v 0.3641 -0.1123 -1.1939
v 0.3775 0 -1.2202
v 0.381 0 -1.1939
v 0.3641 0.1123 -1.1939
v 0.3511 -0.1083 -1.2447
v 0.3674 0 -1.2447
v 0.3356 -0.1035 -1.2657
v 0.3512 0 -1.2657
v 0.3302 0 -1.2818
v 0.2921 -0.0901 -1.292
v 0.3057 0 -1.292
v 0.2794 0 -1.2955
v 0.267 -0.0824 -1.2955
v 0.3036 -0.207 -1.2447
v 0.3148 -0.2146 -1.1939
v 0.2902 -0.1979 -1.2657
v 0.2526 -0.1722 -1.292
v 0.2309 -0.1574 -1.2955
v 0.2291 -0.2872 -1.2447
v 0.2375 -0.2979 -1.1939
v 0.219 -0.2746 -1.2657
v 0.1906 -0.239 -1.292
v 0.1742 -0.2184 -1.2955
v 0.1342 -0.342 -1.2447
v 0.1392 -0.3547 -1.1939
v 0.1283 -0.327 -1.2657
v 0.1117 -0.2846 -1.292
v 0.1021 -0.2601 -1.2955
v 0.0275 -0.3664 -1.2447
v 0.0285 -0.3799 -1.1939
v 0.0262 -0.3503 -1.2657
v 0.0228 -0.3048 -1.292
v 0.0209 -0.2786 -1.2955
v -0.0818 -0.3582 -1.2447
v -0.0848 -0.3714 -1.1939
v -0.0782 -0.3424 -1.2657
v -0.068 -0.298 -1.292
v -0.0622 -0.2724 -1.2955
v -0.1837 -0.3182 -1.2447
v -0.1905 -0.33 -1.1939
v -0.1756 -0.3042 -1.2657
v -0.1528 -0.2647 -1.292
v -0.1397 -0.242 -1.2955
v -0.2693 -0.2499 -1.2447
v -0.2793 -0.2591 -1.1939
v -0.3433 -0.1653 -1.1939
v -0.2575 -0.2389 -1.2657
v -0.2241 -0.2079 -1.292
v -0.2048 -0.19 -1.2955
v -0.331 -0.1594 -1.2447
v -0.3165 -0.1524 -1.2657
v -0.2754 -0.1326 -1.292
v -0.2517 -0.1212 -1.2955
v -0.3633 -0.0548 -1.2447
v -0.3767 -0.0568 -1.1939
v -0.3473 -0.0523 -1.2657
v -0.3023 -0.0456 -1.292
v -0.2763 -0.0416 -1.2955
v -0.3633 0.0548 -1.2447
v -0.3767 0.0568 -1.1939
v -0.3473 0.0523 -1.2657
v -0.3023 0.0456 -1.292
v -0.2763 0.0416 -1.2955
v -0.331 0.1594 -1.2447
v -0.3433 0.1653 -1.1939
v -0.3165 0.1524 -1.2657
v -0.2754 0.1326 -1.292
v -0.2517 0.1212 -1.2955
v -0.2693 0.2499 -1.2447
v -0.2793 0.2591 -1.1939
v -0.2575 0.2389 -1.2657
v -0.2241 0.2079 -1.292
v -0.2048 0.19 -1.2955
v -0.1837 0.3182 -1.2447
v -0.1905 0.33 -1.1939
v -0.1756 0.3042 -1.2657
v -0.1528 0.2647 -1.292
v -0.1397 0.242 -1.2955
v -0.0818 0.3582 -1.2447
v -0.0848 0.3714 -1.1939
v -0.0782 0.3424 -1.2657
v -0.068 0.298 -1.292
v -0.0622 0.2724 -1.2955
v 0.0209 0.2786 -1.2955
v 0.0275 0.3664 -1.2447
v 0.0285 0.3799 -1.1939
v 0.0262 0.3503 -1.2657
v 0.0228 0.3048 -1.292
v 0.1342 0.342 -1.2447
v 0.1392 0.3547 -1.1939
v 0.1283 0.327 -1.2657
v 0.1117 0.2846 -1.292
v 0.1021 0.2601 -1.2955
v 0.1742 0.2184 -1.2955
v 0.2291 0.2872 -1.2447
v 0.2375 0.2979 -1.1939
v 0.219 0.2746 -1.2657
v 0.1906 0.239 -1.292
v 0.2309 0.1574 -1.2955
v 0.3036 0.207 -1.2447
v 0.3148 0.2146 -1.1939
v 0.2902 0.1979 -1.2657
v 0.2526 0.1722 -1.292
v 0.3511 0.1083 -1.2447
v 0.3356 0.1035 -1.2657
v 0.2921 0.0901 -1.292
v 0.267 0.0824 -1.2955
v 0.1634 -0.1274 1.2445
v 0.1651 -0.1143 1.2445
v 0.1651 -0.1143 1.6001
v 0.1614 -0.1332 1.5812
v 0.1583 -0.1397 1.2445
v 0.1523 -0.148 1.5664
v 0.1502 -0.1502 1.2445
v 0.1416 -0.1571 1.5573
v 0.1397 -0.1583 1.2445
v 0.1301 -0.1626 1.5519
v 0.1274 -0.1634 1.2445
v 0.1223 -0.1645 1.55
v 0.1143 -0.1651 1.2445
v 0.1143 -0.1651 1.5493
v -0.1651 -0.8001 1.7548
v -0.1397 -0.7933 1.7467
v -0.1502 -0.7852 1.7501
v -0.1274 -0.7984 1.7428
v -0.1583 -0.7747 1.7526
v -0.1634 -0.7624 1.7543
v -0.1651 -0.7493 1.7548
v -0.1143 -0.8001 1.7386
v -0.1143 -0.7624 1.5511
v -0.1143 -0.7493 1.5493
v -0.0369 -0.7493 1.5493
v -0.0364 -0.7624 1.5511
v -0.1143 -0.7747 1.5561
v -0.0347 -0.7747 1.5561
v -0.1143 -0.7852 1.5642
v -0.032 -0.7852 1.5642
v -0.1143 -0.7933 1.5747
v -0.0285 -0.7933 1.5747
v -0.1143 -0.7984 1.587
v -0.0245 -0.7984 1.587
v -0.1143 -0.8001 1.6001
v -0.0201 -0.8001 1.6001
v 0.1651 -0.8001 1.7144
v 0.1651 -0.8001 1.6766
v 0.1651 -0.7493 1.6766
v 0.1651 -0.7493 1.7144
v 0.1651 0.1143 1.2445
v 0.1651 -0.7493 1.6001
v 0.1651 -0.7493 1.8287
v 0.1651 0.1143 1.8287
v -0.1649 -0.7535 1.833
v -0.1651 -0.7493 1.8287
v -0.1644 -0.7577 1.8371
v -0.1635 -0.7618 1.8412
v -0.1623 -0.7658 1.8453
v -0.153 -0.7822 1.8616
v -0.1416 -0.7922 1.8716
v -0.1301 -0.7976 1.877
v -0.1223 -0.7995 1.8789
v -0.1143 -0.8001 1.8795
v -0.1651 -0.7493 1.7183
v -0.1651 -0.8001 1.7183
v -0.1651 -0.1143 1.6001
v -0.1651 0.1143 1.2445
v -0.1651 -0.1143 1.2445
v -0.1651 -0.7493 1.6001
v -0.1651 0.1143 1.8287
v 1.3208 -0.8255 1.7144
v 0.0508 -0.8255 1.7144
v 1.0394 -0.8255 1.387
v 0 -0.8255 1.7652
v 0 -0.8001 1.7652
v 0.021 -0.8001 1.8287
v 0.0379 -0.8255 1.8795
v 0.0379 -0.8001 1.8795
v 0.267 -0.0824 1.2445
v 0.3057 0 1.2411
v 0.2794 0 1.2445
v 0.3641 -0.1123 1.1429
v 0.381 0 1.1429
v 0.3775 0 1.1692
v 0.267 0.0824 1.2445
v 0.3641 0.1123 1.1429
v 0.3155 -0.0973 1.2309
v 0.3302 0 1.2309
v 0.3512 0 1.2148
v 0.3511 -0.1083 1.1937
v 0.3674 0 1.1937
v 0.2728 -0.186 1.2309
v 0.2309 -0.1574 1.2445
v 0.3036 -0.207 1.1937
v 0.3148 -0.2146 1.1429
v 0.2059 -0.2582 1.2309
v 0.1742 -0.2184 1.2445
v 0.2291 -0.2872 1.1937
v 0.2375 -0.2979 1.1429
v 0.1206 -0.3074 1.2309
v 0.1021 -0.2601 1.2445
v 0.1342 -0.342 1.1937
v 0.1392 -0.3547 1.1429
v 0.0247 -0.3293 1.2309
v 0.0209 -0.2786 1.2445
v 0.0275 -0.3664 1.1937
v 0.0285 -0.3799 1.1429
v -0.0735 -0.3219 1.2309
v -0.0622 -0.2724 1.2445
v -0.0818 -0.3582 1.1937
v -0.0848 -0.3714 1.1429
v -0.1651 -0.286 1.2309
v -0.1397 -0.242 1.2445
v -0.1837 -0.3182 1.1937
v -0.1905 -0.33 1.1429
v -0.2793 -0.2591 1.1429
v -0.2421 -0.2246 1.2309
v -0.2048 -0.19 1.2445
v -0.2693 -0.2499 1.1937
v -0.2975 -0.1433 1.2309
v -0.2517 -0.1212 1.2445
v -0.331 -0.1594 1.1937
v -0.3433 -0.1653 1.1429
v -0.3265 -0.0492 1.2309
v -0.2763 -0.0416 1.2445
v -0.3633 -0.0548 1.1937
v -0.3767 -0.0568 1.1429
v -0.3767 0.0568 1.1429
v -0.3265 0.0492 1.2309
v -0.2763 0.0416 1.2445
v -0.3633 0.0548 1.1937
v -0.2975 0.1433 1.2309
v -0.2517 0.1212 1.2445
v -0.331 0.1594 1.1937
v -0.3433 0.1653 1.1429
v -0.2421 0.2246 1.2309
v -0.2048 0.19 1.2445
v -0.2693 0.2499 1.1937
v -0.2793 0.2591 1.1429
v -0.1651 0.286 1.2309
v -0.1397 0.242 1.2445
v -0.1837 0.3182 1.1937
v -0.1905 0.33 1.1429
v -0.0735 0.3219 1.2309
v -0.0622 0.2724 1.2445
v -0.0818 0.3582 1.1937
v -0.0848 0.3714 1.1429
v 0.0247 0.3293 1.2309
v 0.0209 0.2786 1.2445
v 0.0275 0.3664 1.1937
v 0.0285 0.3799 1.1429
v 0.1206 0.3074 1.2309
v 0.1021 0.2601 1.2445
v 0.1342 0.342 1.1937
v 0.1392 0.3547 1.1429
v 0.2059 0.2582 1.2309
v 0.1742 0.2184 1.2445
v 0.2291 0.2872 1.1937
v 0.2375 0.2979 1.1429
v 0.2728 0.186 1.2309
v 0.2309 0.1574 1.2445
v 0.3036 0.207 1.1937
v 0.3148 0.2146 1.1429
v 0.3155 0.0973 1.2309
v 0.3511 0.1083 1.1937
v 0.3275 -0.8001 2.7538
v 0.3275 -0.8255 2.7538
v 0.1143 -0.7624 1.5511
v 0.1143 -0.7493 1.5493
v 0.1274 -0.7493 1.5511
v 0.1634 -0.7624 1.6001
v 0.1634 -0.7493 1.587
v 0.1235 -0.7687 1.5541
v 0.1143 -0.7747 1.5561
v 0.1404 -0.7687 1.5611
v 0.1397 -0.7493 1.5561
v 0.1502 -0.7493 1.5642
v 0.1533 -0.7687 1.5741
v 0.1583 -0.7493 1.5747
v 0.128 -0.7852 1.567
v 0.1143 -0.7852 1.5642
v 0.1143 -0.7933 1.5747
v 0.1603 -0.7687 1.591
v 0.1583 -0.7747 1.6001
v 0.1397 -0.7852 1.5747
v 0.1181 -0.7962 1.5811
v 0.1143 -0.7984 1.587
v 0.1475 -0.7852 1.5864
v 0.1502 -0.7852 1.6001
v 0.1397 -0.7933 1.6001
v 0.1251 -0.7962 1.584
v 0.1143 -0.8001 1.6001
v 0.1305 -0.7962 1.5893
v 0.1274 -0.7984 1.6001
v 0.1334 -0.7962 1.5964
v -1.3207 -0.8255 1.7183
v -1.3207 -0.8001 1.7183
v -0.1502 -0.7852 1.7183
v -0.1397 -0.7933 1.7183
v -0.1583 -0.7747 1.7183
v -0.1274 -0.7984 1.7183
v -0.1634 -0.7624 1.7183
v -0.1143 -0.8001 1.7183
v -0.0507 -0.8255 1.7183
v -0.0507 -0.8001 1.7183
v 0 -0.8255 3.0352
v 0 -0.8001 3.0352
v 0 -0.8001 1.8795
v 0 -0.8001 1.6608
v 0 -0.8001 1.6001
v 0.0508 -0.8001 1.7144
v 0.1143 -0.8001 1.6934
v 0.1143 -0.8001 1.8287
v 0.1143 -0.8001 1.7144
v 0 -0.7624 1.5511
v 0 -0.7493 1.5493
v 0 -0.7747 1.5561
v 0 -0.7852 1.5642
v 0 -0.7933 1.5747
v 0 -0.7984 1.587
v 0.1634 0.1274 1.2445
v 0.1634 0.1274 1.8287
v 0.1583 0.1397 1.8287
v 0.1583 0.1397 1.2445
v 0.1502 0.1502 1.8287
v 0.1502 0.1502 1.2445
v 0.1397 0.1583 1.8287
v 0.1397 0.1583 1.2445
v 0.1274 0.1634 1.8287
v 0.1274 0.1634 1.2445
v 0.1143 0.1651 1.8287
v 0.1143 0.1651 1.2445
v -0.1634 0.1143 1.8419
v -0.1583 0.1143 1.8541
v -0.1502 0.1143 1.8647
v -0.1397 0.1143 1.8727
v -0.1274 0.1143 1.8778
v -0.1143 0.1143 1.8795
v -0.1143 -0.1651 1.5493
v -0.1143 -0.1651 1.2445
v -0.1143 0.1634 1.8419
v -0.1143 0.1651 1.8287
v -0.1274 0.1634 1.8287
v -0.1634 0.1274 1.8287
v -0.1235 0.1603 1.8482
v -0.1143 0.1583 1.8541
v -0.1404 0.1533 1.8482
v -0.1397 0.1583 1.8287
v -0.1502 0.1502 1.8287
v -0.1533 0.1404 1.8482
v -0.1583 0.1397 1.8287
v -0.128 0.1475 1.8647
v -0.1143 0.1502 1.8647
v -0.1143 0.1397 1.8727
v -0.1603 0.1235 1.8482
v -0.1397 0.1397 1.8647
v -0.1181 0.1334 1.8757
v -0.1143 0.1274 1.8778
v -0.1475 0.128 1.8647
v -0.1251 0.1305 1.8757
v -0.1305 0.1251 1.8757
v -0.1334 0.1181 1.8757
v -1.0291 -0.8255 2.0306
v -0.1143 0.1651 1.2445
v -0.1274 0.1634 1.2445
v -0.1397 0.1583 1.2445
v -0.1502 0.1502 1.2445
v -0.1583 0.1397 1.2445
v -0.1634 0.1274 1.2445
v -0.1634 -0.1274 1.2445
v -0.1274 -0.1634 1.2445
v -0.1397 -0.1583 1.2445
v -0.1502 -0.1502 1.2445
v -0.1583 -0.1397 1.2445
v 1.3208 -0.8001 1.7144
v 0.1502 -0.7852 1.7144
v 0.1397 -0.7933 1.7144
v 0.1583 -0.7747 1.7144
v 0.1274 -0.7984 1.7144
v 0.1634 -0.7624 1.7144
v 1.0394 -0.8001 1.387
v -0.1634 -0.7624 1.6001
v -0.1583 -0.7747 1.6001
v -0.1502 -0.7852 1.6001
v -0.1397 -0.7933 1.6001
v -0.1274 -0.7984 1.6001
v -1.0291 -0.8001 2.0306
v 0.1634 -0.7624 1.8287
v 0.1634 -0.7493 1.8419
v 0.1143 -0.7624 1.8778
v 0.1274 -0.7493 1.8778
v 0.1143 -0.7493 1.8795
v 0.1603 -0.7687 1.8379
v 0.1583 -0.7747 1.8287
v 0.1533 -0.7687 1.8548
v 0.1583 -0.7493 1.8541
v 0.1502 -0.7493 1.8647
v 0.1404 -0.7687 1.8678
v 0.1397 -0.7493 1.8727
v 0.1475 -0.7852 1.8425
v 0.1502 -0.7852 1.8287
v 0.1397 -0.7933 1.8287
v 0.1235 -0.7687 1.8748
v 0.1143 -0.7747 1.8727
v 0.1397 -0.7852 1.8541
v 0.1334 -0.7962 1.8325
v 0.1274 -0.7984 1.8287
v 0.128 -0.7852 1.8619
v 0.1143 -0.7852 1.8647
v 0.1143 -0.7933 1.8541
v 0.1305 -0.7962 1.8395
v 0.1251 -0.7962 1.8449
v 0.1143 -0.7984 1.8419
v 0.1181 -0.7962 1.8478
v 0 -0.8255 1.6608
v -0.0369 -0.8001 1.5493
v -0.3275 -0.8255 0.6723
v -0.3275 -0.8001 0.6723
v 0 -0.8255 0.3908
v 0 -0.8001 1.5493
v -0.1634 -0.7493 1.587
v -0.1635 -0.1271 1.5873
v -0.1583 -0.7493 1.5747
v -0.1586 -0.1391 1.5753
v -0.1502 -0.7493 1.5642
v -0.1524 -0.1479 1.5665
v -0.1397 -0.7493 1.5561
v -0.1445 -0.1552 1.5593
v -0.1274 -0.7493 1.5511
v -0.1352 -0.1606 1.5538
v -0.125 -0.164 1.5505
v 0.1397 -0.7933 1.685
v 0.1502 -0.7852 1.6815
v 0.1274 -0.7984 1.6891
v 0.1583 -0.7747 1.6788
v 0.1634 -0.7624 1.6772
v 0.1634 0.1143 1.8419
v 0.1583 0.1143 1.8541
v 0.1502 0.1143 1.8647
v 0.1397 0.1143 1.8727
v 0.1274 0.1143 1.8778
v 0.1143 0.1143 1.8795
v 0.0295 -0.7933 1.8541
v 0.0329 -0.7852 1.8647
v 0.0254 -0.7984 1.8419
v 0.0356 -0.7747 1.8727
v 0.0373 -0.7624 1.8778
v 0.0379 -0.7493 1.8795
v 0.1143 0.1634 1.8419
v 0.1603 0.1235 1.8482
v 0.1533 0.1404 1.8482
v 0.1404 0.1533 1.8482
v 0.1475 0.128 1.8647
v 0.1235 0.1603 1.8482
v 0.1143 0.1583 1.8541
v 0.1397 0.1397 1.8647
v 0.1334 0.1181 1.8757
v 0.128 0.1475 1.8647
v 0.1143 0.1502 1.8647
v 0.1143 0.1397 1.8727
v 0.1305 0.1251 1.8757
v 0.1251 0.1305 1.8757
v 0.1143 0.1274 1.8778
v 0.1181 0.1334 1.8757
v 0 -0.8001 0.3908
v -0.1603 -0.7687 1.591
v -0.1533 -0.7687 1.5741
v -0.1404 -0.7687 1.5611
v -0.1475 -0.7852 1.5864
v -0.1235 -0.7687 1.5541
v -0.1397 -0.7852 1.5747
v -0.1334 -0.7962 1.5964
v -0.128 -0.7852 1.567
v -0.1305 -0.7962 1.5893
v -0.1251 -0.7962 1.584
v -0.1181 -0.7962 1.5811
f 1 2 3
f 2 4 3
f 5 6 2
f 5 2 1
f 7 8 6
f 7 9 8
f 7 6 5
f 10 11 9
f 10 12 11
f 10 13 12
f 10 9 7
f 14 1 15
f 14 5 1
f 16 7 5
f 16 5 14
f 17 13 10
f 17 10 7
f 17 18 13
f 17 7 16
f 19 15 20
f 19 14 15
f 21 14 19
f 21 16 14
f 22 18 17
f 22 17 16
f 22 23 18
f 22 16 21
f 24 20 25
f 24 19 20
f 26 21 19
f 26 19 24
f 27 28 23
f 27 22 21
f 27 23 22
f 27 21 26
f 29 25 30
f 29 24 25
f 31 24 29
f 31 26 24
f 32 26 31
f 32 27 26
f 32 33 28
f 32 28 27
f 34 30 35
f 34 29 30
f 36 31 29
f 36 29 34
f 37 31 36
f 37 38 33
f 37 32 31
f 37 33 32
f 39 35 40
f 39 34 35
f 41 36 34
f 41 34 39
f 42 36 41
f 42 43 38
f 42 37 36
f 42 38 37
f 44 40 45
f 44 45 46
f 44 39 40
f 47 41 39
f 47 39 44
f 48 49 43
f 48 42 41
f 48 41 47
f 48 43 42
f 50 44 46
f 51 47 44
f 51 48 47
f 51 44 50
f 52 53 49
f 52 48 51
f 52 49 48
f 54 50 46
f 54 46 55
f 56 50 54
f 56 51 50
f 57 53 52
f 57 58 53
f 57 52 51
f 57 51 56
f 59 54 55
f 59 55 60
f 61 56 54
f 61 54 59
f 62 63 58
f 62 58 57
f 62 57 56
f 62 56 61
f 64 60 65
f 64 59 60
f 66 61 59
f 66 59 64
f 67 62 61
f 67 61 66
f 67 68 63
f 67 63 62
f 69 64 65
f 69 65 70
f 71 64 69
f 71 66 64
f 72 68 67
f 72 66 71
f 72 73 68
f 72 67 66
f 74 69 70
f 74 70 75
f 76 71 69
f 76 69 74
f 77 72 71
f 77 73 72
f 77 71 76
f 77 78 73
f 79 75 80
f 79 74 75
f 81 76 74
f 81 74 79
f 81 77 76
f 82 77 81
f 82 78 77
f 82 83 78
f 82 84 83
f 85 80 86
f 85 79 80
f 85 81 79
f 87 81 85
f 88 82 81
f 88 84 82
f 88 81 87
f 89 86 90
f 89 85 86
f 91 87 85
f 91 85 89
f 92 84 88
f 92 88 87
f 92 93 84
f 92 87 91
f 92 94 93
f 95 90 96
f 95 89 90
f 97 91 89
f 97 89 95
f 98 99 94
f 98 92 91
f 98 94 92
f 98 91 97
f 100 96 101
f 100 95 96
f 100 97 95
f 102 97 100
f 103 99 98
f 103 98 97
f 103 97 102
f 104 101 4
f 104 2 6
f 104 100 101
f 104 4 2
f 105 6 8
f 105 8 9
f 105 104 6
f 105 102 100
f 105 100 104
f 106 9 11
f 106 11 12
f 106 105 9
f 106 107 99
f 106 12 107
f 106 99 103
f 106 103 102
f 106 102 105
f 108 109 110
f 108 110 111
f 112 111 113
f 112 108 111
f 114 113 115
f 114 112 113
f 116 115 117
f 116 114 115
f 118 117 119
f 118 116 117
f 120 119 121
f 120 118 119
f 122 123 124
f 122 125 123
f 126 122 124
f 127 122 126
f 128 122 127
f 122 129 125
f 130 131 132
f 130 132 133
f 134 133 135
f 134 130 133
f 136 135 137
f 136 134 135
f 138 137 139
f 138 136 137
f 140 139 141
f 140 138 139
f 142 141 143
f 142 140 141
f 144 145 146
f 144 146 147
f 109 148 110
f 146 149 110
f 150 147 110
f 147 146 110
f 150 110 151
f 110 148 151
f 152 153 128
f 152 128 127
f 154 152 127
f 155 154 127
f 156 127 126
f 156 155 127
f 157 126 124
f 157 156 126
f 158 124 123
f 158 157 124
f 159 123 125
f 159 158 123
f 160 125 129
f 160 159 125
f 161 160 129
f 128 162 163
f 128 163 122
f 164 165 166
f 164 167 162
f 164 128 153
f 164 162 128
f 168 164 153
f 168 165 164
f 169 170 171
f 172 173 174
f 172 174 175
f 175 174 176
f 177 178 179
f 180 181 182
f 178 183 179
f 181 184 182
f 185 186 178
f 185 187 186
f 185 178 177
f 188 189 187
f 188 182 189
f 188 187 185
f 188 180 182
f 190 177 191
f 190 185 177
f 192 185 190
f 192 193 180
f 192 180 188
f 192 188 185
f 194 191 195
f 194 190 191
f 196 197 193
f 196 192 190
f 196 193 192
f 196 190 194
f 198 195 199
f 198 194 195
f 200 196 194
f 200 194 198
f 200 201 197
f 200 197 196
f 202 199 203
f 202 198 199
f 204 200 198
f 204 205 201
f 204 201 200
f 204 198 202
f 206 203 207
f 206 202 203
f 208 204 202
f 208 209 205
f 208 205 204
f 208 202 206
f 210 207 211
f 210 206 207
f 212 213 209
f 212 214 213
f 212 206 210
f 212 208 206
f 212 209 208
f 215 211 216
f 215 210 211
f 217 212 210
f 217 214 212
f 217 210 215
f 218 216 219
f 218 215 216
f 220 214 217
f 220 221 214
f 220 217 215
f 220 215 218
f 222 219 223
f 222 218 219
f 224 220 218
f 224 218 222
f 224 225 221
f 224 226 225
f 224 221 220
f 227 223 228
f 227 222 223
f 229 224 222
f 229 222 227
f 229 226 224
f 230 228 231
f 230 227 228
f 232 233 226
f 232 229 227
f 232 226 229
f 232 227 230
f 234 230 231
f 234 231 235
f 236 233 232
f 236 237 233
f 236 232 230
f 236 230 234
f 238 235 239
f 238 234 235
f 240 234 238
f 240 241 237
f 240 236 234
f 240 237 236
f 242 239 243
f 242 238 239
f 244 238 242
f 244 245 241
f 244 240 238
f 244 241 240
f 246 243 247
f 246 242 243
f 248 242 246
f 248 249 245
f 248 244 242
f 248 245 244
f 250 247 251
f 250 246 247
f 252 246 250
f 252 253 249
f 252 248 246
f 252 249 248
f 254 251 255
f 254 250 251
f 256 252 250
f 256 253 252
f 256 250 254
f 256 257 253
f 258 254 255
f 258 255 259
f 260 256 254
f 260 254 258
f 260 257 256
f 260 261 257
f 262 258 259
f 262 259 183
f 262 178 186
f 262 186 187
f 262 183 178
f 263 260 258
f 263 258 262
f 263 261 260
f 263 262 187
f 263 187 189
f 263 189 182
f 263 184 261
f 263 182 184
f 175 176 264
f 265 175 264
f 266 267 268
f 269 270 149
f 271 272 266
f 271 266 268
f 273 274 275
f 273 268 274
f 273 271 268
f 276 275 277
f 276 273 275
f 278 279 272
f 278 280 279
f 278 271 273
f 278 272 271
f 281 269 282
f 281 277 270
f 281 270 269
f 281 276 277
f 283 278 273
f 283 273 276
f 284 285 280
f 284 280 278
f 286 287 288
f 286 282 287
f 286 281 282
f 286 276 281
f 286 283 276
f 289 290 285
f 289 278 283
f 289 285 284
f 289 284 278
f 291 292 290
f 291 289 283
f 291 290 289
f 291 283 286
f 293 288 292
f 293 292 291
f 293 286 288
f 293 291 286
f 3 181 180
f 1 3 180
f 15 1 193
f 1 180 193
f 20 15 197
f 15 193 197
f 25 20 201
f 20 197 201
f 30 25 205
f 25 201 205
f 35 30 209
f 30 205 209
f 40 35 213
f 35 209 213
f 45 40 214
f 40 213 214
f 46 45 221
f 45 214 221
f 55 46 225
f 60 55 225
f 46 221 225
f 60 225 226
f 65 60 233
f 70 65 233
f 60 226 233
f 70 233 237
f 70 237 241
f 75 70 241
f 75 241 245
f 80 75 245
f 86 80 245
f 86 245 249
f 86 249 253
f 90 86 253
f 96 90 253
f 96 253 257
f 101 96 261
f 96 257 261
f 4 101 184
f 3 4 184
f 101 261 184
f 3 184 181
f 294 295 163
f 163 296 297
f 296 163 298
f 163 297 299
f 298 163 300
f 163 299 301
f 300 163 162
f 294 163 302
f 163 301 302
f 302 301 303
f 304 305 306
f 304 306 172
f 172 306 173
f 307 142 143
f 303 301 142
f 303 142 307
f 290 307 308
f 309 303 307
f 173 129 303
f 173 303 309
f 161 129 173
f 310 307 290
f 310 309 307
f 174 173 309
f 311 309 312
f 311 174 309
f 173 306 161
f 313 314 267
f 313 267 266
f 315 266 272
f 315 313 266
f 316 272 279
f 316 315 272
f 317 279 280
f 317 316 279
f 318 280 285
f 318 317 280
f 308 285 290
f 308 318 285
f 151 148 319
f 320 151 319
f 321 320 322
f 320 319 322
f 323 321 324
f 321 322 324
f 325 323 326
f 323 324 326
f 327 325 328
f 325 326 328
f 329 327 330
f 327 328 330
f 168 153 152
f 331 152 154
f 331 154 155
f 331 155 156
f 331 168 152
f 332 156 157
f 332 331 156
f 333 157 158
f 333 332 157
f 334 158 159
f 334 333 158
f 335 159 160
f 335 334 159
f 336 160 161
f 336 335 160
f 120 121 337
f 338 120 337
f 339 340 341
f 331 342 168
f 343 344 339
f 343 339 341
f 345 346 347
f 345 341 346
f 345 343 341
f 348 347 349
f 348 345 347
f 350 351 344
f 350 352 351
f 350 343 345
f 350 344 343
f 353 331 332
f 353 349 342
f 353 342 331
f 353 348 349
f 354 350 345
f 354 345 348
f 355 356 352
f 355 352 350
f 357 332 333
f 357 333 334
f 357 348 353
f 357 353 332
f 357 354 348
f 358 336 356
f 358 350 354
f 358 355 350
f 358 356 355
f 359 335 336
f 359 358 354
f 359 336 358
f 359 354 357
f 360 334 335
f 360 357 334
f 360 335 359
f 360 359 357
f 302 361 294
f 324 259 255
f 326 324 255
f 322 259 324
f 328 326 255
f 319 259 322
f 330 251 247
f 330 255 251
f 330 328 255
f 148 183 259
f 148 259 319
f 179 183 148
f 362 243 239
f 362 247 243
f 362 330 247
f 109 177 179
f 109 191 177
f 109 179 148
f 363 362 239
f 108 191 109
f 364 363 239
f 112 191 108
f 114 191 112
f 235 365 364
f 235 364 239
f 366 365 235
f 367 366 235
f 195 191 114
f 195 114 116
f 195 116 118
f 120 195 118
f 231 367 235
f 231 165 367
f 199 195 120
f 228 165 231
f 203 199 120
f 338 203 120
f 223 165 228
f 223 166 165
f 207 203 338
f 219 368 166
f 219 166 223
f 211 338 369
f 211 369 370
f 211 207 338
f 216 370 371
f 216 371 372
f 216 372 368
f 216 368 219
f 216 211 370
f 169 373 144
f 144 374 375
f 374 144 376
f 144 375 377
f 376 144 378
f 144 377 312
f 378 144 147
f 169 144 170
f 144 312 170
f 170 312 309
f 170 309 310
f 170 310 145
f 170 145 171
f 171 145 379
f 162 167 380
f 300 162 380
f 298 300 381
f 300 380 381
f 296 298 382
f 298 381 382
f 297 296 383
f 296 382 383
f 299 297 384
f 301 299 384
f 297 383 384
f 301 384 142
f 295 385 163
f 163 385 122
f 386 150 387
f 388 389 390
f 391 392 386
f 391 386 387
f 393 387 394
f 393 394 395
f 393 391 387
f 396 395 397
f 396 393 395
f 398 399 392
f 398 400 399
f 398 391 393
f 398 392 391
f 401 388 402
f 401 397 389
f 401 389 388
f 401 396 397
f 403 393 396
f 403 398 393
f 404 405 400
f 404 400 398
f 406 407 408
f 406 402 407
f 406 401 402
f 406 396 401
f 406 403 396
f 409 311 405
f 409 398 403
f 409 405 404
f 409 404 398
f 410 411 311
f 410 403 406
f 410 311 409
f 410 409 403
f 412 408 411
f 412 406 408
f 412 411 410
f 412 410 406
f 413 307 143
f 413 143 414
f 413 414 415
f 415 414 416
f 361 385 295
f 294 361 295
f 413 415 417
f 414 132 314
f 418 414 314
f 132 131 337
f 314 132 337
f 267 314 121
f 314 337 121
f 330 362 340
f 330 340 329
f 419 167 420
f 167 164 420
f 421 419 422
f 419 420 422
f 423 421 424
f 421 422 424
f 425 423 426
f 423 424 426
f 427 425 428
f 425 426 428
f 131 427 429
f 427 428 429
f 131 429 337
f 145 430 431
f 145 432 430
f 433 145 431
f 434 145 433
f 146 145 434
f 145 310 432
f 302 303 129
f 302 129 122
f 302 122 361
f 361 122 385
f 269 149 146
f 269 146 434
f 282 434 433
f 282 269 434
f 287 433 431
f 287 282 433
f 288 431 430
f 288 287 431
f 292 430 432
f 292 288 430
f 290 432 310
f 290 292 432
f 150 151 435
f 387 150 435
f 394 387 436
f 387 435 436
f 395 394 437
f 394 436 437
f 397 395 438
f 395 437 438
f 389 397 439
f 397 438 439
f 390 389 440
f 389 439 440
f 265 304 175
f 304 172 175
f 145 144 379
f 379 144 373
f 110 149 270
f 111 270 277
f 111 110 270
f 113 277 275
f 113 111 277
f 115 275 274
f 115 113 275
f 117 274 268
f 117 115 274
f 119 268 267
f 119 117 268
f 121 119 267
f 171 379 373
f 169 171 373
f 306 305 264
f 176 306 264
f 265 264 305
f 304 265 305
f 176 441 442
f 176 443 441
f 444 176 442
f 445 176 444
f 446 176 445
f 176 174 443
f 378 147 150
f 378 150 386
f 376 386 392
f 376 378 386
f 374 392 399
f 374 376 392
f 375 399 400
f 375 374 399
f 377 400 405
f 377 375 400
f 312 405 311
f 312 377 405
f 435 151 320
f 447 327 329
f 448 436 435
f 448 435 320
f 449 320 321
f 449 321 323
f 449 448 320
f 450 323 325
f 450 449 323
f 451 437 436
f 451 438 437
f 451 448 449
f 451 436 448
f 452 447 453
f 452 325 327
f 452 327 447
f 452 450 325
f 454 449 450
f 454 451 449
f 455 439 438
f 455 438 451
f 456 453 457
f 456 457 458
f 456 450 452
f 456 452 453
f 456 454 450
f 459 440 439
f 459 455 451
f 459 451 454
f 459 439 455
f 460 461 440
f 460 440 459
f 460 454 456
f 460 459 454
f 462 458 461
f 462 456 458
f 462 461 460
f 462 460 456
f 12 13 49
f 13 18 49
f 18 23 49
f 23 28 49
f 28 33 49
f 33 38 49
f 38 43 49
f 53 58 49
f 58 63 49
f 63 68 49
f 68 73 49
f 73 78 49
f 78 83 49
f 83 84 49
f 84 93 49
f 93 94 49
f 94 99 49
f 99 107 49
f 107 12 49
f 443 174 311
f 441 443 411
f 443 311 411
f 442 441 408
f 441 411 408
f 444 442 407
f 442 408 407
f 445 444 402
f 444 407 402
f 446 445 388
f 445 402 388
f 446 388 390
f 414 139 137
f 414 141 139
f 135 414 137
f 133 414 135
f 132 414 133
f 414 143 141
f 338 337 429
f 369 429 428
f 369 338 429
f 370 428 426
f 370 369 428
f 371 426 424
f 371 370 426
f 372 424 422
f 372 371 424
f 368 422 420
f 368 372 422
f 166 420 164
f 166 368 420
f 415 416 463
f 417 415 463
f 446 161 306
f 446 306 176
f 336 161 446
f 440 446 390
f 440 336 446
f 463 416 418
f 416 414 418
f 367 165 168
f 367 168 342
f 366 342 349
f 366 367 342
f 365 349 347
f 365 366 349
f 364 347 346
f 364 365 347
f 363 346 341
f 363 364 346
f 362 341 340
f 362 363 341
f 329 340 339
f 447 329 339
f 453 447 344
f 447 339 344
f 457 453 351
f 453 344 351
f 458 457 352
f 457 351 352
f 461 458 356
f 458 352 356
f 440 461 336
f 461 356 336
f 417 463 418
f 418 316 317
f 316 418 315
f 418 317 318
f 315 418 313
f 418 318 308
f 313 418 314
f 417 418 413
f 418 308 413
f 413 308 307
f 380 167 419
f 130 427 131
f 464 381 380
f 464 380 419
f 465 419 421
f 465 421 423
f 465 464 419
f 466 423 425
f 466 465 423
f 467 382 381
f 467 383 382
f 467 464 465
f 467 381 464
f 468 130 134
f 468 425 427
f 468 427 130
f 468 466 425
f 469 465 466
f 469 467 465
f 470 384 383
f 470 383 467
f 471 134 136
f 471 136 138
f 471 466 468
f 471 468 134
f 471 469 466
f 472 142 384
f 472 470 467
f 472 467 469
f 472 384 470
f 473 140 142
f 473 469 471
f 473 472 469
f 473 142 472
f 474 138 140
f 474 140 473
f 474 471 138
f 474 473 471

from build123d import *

# Parameters (mm, degrees)
F0_W           = 0.381
F0_H           = 2.54
F2_W           = 0.3302
F2_H           = 0.3302
F3_DEPTH       = 0.635
F4_W           = 0.3302
F4_H           = 0.3302
F5_DEPTH       = 0.635
F6_DEPTH       = 0.635
F8_DEPTH       = 0.0254
F9_DEPTH       = 0.0254
F11_DEPTH      = 0.0254
F13_DEPTH      = 0.0254
F15_DEPTH      = 0.0254
F16_T1_DEPTH   = 0.8636
F16_T3_DEPTH   = 0.5842
F16_T5_DEPTH   = 0.3048
F16_T7_DEPTH   = 0.5842
F16_T9_DEPTH   = 0.2286
F16_T11_DEPTH  = 1.0414
F16_T13_DEPTH  = 0.1181413534
F16_T15_DEPTH  = 0.1143
F16_T17_DEPTH  = 0.1143
F16_S21_W      = 0.051816
F16_S21_H      = 0.051816
F16_T22_DEPTH  = 0.051816
F16_S27_W      = 0.051816
F16_S27_H      = 0.051816
F16_T28_DEPTH  = 0.051816
F16_S33_W      = 0.051816
F16_S33_H      = 0.051816
F16_T34_DEPTH  = 0.051816
F16_S39_W      = 0.051816
F16_S39_H      = 0.051816
F16_T40_DEPTH  = 0.051816
F16_S45_W      = 0.051816
F16_S45_H      = 0.051816
F16_T46_DEPTH  = 0.051816
F16_T52_DEPTH  = 0.3787263164
F16_T57_DEPTH  = 0.3787263164
F16_T62_DEPTH  = 0.2451413534
F16_T67_DEPTH  = 0.2413
F16_T72_DEPTH  = 0.2043645658
F16_T77_DEPTH  = 0.2043645658
F16_T82_DEPTH  = 0.2413
F16_T87_DEPTH  = 0.2034354496
F16_T92_DEPTH  = 0.2034354496
F16_T97_DEPTH  = 0.2034354496
F16_T103_DEPTH = 0.4318
F16_T107_DEPTH = 0.7112
F16_T114_DEPTH = 0.4318
F16_T118_DEPTH = 0.7112
F17_R          = 0.1016


# Not quite as in the source:
# - a fillet or chamfer that OpenCascade refuses, or shapes differently, is made with other operations: its cross-section is extruded or revolved along the edge and cut away or added
# - a feature names something its author has since deleted; it is built from what else it names


with BuildPart() as f1:
    # F0 (on Front) → F1 (revolve)
    with BuildSketch(Plane.XZ):
        with Locations((0.1905, -0.0254572569)):
            Rectangle(F0_W, F0_H)
    revolve(axis=Axis((0, 0, -0.0254572569), (0, 0, -1)))

    # F2 (on face) → F3 (join)
    with BuildSketch(Plane.XY.offset(1.2445427431)):
        Rectangle(F2_W, F2_H)
    extrude(amount=F3_DEPTH)

    # F4 (on face) → F5 (join)
    with BuildSketch(Plane.XZ.offset(0.1651)):
        with Locations((0, 1.7144427431)):
            Rectangle(F4_W, F4_H)
    extrude(amount=F5_DEPTH)

    # F2 (on face) → F6 (join)
    with BuildSketch(Plane.XY.offset(1.2445427431)):
        Rectangle(F2_W, F2_H)
    extrude(amount=F6_DEPTH)

    # F7 (on face) → F8 (join)
    with BuildSketch(Plane.XZ.offset(0.8001)):
        Polygon((0, 3.0352427431), (0, 1.8795427431), (0.0378645504, 1.8795427431), (0.3274862888, 2.7538107431), align=None)
        Polygon((0, 1.8795427431), (0, 1.7652427431), (0.0378645504, 1.8795427431), align=None)
    extrude(amount=F8_DEPTH)

    # F7 (on face) → F9 (join)
    with BuildSketch(Plane.XZ.offset(0.8001)):
        Polygon((0, 3.0352427431), (0, 1.7652427431), (0.3274862888, 2.7538107431), align=None)
    extrude(amount=F9_DEPTH)

    # F10 (on face) → F11 (join)
    with BuildSketch(Plane.XZ.offset(0.8001)):
        Polygon((1.3208, 1.7144427431), (0.0508, 1.7144427431), (1.039368, 1.3869564543), align=None)
    extrude(amount=F11_DEPTH)

    # F12 (on face) → F13 (join)
    with BuildSketch(Plane.XZ.offset(0.8001)):
        Polygon((0, 0.3908380623), (0, 1.6608380623), (-0.3274862888, 0.6722700623), align=None)
    extrude(amount=F13_DEPTH)

    # F14 (on face) → F15 (join)
    with BuildSketch(Plane.XZ.offset(0.8001)):
        Polygon((-1.3206545556, 1.7182840966), (-0.0506545556, 1.7182840966), (-1.0291112121, 2.0306189544), align=None)
    extrude(amount=F15_DEPTH)

    # F16: fillet of radius 0.0508 on 16 edges, made by hand

    # F16_s2 → F16_t1 (cut)
    with BuildSketch(Plane.XZ.offset(-0.1143)):
        with BuildLine():
            ThreePointArc((0.1651, 1.8287427431), (0.1502210245, 1.8646637676), (0.1143, 1.8795427431))
            Line((0.1143, 1.8795427431), (0.1651, 1.8795427431))
            Line((0.1651, 1.8795427431), (0.1651, 1.8287427431))
        make_face()
    extrude(amount=F16_T1_DEPTH, mode=Mode.SUBTRACT)

    # F16_s4 → F16_t3 (cut)
    with BuildSketch(Plane.XZ.offset(0.1651)):
        with BuildLine():
            ThreePointArc((0.1651, 1.6001427431), (0.1502210245, 1.5642217186), (0.1143, 1.5493427431))
            Line((0.1143, 1.5493427431), (0.1651, 1.5493427431))
            Line((0.1651, 1.5493427431), (0.1651, 1.6001427431))
        make_face()
        with BuildLine():
            ThreePointArc((-0.1651, 1.6001427431), (-0.1502210245, 1.5642217186), (-0.1143, 1.5493427431))
            Line((-0.1143, 1.5493427431), (-0.1651, 1.5493427431))
            Line((-0.1651, 1.5493427431), (-0.1651, 1.6001427431))
        make_face()
    extrude(amount=F16_T3_DEPTH, mode=Mode.SUBTRACT)

    # F16_s6 → F16_t5 (cut)
    with BuildSketch(Plane.XY.offset(1.2445427431)):
        with BuildLine():
            ThreePointArc((0.1651, -0.1143), (0.1502210245, -0.1502210245), (0.1143, -0.1651))
            Line((0.1143, -0.1651), (0.1651, -0.1651))
            Line((0.1651, -0.1651), (0.1651, -0.1143))
        make_face()
        with BuildLine():
            ThreePointArc((-0.1143, -0.1651), (-0.1502210245, -0.1502210245), (-0.1651, -0.1143))
            Line((-0.1651, -0.1143), (-0.1651, -0.1651))
            Line((-0.1651, -0.1651), (-0.1143, -0.1651))
        make_face()
    extrude(amount=F16_T5_DEPTH, mode=Mode.SUBTRACT)

    # F16_s8 → F16_t7 (cut)
    with BuildSketch(Plane.XY.offset(1.2445427431)):
        with BuildLine():
            ThreePointArc((0.1651, 0.1143), (0.1502210245, 0.1502210245), (0.1143, 0.1651))
            Line((0.1143, 0.1651), (0.1651, 0.1651))
            Line((0.1651, 0.1651), (0.1651, 0.1143))
        make_face()
        with BuildLine():
            ThreePointArc((-0.1651, 0.1143), (-0.1502210245, 0.1502210245), (-0.1143, 0.1651))
            Line((-0.1143, 0.1651), (-0.1651, 0.1651))
            Line((-0.1651, 0.1651), (-0.1651, 0.1143))
        make_face()
    extrude(amount=F16_T7_DEPTH, mode=Mode.SUBTRACT)

    # F16_s10 → F16_t9 (cut)
    with BuildSketch(Plane.YZ.offset(-0.1143)):
        with BuildLine():
            ThreePointArc((0.1651, 1.8287427431), (0.1502210245, 1.8646637676), (0.1143, 1.8795427431))
            Line((0.1143, 1.8795427431), (0.1651, 1.8795427431))
            Line((0.1651, 1.8795427431), (0.1651, 1.8287427431))
        make_face()
    extrude(amount=F16_T9_DEPTH, mode=Mode.SUBTRACT)

    # F16_s12 → F16_t11 (cut)
    with BuildSketch(Plane.XZ.offset(-0.1143)):
        with BuildLine():
            ThreePointArc((-0.1651, 1.8287427431), (-0.1502210245, 1.8646637676), (-0.1143, 1.8795427431))
            Line((-0.1143, 1.8795427431), (-0.1651, 1.8795427431))
            Line((-0.1651, 1.8795427431), (-0.1651, 1.8287427431))
        make_face()
    extrude(amount=F16_T11_DEPTH, mode=Mode.SUBTRACT)

    # F16_s14 → F16_t13 (cut)
    with BuildSketch(Plane.XY.offset(1.6001427431)):
        with BuildLine():
            ThreePointArc((-0.1651, -0.7493), (-0.1502210245, -0.7852210245), (-0.1143, -0.8001))
            Line((-0.1143, -0.8001), (-0.1651, -0.8001))
            Line((-0.1651, -0.8001), (-0.1651, -0.7493))
        make_face()
    extrude(amount=F16_T13_DEPTH, mode=Mode.SUBTRACT)

    # F16_s16 → F16_t15 (cut)
    with BuildSketch(Plane.YZ):
        with BuildLine():
            ThreePointArc((-0.7493, 1.5493427431), (-0.7852210245, 1.5642217186), (-0.8001, 1.6001427431))
            Line((-0.8001, 1.6001427431), (-0.8001, 1.5493427431))
            Line((-0.8001, 1.5493427431), (-0.7493, 1.5493427431))
        make_face()
    extrude(amount=F16_T15_DEPTH, mode=Mode.SUBTRACT)

    # F16_s18 → F16_t17 (cut)
    with BuildSketch(Plane.XY.offset(1.7144427431)):
        with BuildLine():
            ThreePointArc((0.1651, -0.7493), (0.1502210245, -0.7852210245), (0.1143, -0.8001))
            Line((0.1143, -0.8001), (0.1651, -0.8001))
            Line((0.1651, -0.8001), (0.1651, -0.7493))
        make_face()
    extrude(amount=F16_T17_DEPTH, mode=Mode.SUBTRACT)


with BuildPart() as f16_tool20:
    # F16_s21 → F16_t22 (new body)
    with BuildSketch(Plane.XY.offset(1.8287427431)):
        with Locations((0.140208, 0.140208)):
            Rectangle(F16_S21_W, F16_S21_H)
    extrude(amount=F16_T22_DEPTH)

    # F16_s23 → F16_t24 (revolve, cut)
    with BuildSketch(Plane(origin=(0.1143, 0.1143, 1.8287427431), x_dir=(-0.7071067812, -0.7071067812, 0), z_dir=(-0.7071067812, 0.7071067812, 0))):
        with BuildLine():
            ThreePointArc((0, -0.0508), (0.0508, 0), (0, 0.0508))
            Line((0, 0.0508), (0, -0.0508))
        make_face()
    revolve(axis=Axis((0.1143, 0.1143, 1.8287427431), (0, 0, 1)), mode=Mode.SUBTRACT)


with BuildPart() as f1_1:
    add(f1.part)

    # F16_t19: cut F16_tool20
    add(f16_tool20.part, mode=Mode.SUBTRACT)


with BuildPart() as f16_tool26:
    # F16_s27 → F16_t28 (new body)
    with BuildSketch(Plane.XZ.offset(0.7493)):
        with Locations((0.140208, 1.8546507431)):
            Rectangle(F16_S27_W, F16_S27_H)
    extrude(amount=F16_T28_DEPTH)

    # F16_s29 → F16_t30 (revolve, cut)
    with BuildSketch(Plane(origin=(0.1143, -0.7493, 1.8287427431), x_dir=(-0.7071067812, 0, -0.7071067812), z_dir=(-0.7071067812, 0, 0.7071067812))):
        with BuildLine():
            ThreePointArc((0, -0.0508), (0.0508, 0), (0, 0.0508))
            Line((0, 0.0508), (0, -0.0508))
        make_face()
    revolve(axis=Axis((0.1143, -0.7493, 1.8287427431), (0, -1, 0)), mode=Mode.SUBTRACT)


with BuildPart() as f1_2:
    add(f1_1.part)

    # F16_t25: cut F16_tool26
    add(f16_tool26.part, mode=Mode.SUBTRACT)


with BuildPart() as f16_tool32:
    # F16_s33 → F16_t34 (new body)
    with BuildSketch(Plane.XZ.offset(0.7493)):
        with Locations((0.140208, 1.5742347431)):
            Rectangle(F16_S33_W, F16_S33_H)
    extrude(amount=F16_T34_DEPTH)

    # F16_s35 → F16_t36 (revolve, cut)
    with BuildSketch(Plane(origin=(0.1143, -0.7493, 1.6001427431), x_dir=(-0.7071067812, 0, 0.7071067812), z_dir=(0.7071067812, 0, 0.7071067812))):
        with BuildLine():
            ThreePointArc((0, -0.0508), (0.0508, 0), (0, 0.0508))
            Line((0, 0.0508), (0, -0.0508))
        make_face()
    revolve(axis=Axis((0.1143, -0.7493, 1.6001427431), (0, -1, 0)), mode=Mode.SUBTRACT)


with BuildPart() as f1_3:
    add(f1_2.part)

    # F16_t31: cut F16_tool32
    add(f16_tool32.part, mode=Mode.SUBTRACT)


with BuildPart() as f16_tool38:
    # F16_s39 → F16_t40 (new body)
    with BuildSketch(Plane.XY.offset(1.8287427431)):
        with Locations((-0.140208, 0.140208)):
            Rectangle(F16_S39_W, F16_S39_H)
    extrude(amount=F16_T40_DEPTH)

    # F16_s41 → F16_t42 (revolve, cut)
    with BuildSketch(Plane(origin=(-0.1143, 0.1143, 1.8287427431), x_dir=(0.7071067812, -0.7071067812, 0), z_dir=(-0.7071067812, -0.7071067812, 0))):
        with BuildLine():
            ThreePointArc((0, -0.0508), (0.0508, 0), (0, 0.0508))
            Line((0, 0.0508), (0, -0.0508))
        make_face()
    revolve(axis=Axis((-0.1143, 0.1143, 1.8287427431), (0, 0, 1)), mode=Mode.SUBTRACT)


with BuildPart() as f1_4:
    add(f1_3.part)

    # F16_t37: cut F16_tool38
    add(f16_tool38.part, mode=Mode.SUBTRACT)


with BuildPart() as f16_tool44:
    # F16_s45 → F16_t46 (new body)
    with BuildSketch(Plane.XZ.offset(0.7493)):
        with Locations((-0.140208, 1.5742347431)):
            Rectangle(F16_S45_W, F16_S45_H)
    extrude(amount=F16_T46_DEPTH)

    # F16_s47 → F16_t48 (revolve, cut)
    with BuildSketch(Plane(origin=(-0.1143, -0.7493, 1.6001427431), x_dir=(0.7071067812, 0, 0.7071067812), z_dir=(0.7071067812, 0, -0.7071067812))):
        with BuildLine():
            ThreePointArc((0, -0.0508), (0.0508, 0), (0, 0.0508))
            Line((0, 0.0508), (0, -0.0508))
        make_face()
    revolve(axis=Axis((-0.1143, -0.7493, 1.6001427431), (0, -1, 0)), mode=Mode.SUBTRACT)


with BuildPart() as f1_5:
    add(f1_4.part)

    # F16_t43: cut F16_tool44
    add(f16_tool44.part, mode=Mode.SUBTRACT)


with BuildPart() as f16_tool50:
    # F16_s51 → F16_t52 (new body)
    with BuildSketch(Plane.XY.offset(2.0065427431)):
        with BuildLine():
            ThreePointArc((-0.1651, -0.7493), (-0.1502210245, -0.7852210245), (-0.1143, -0.8001))
            Line((-0.1143, -0.8001), (-0.1651, -0.8001))
            Line((-0.1651, -0.8001), (-0.1651, -0.7493))
        make_face()
    extrude(amount=-F16_T52_DEPTH)

    split(bisect_by=Plane(origin=(0.493090904, 0, 1.5447141589), x_dir=(0, 1, 0), z_dir=(0.3040944775, 0, 0.9526418785)), keep=Keep.TOP)


with BuildPart() as f1_6:
    add(f1_5.part)

    # F16_t49: cut F16_tool50
    add(f16_tool50.part, mode=Mode.SUBTRACT)


with BuildPart() as f16_tool55:
    # F16_s56 → F16_t57 (new body)
    with BuildSketch(Plane.XY.offset(2.0065427431)):
        with BuildLine():
            ThreePointArc((-0.1651, -0.7493), (-0.1502210245, -0.7852210245), (-0.1143, -0.8001))
            Line((-0.1143, -0.8001), (-0.1651, -0.8001))
            Line((-0.1651, -0.8001), (-0.1651, -0.7493))
        make_face()
    extrude(amount=-F16_T57_DEPTH)

    split(bisect_by=Plane.XY.offset(1.7182840966), keep=Keep.BOTTOM)


with BuildPart() as f1_7:
    add(f1_6.part)

    # F16_t54: cut F16_tool55
    add(f16_tool55.part, mode=Mode.SUBTRACT)


with BuildPart() as f16_tool60:
    # F16_s61 → F16_t62 (new body)
    with BuildSketch(Plane.XY.offset(1.8452840966)):
        with BuildLine():
            ThreePointArc((-0.1651, -0.7493), (-0.1502210245, -0.7852210245), (-0.1143, -0.8001))
            Line((-0.1143, -0.8001), (-0.1651, -0.8001))
            Line((-0.1651, -0.8001), (-0.1651, -0.7493))
        make_face()
    extrude(amount=-F16_T62_DEPTH)

    split(bisect_by=Plane(origin=(0.493090904, 0, 1.5447141589), x_dir=(0, 1, 0), z_dir=(0.3040944775, 0, 0.9526418785)), keep=Keep.TOP)


with BuildPart() as f1_8:
    add(f1_7.part)

    # F16_t59: cut F16_tool60
    add(f16_tool60.part, mode=Mode.SUBTRACT)


with BuildPart() as f16_tool65:
    # F16_s66 → F16_t67 (new body)
    with BuildSketch(Plane.YZ.offset(-0.127)):
        with BuildLine():
            ThreePointArc((-0.7493, 1.5493427431), (-0.7852210245, 1.5642217186), (-0.8001, 1.6001427431))
            Line((-0.8001, 1.6001427431), (-0.8001, 1.5493427431))
            Line((-0.8001, 1.5493427431), (-0.7493, 1.5493427431))
        make_face()
    extrude(amount=F16_T67_DEPTH)

    split(bisect_by=Plane(origin=(-0.4957832071, 0, 0.1642397919), x_dir=(0, 1, 0), z_dir=(-0.9492682927, 0, 0.3144673409)), keep=Keep.TOP)


with BuildPart() as f1_9:
    add(f1_8.part)

    # F16_t64: cut F16_tool65
    add(f16_tool65.part, mode=Mode.SUBTRACT)


with BuildPart() as f16_tool70:
    # F16_s71 → F16_t72 (new body)
    with BuildSketch(Plane.YZ.offset(-0.1143)):
        with BuildLine():
            ThreePointArc((-0.7493, 1.5493427431), (-0.7852210245, 1.5642217186), (-0.8001, 1.6001427431))
            Line((-0.8001, 1.6001427431), (-0.8001, 1.5493427431))
            Line((-0.8001, 1.5493427431), (-0.7493, 1.5493427431))
        make_face()
    extrude(amount=F16_T72_DEPTH)

    split(bisect_by=Plane(origin=(-0.4957832071, 0, 0.1642397919), x_dir=(0, 1, 0), z_dir=(-0.9492682927, 0, 0.3144673409)), keep=Keep.TOP)


with BuildPart() as f1_10:
    add(f1_9.part)

    # F16_t69: cut F16_tool70
    add(f16_tool70.part, mode=Mode.SUBTRACT)


with BuildPart() as f16_tool75:
    # F16_s76 → F16_t77 (new body)
    with BuildSketch(Plane.YZ.offset(-0.1143)):
        with BuildLine():
            ThreePointArc((-0.7493, 1.5493427431), (-0.7852210245, 1.5642217186), (-0.8001, 1.6001427431))
            Line((-0.8001, 1.6001427431), (-0.8001, 1.5493427431))
            Line((-0.8001, 1.5493427431), (-0.7493, 1.5493427431))
        make_face()
    extrude(amount=F16_T77_DEPTH)

    split(bisect_by=Plane.YZ, keep=Keep.TOP)


with BuildPart() as f1_11:
    add(f1_10.part)

    # F16_t74: cut F16_tool75
    add(f16_tool75.part, mode=Mode.SUBTRACT)


with BuildPart() as f16_tool80:
    # F16_s81 → F16_t82 (new body)
    with BuildSketch(Plane.XY.offset(1.5874427431)):
        with BuildLine():
            ThreePointArc((0.1651, -0.7493), (0.1502210245, -0.7852210245), (0.1143, -0.8001))
            Line((0.1143, -0.8001), (0.1651, -0.8001))
            Line((0.1651, -0.8001), (0.1651, -0.7493))
        make_face()
    extrude(amount=F16_T82_DEPTH)

    split(bisect_by=Plane(origin=(0.5168085453, 0, 1.5600665049), x_dir=(0, 1, 0), z_dir=(-0.3144673409, 0, -0.9492682927)), keep=Keep.TOP)


with BuildPart() as f1_12:
    add(f1_11.part)

    # F16_t79: cut F16_tool80
    add(f16_tool80.part, mode=Mode.SUBTRACT)


with BuildPart() as f16_tool85:
    # F16_s86 → F16_t87 (new body)
    with BuildSketch(Plane.XY.offset(1.6001427431)):
        with BuildLine():
            ThreePointArc((0.1651, -0.7493), (0.1502210245, -0.7852210245), (0.1143, -0.8001))
            Line((0.1143, -0.8001), (0.1651, -0.8001))
            Line((0.1651, -0.8001), (0.1651, -0.7493))
        make_face()
    extrude(amount=F16_T87_DEPTH)

    split(bisect_by=Plane(origin=(0.5168085453, 0, 1.5600665049), x_dir=(0, 1, 0), z_dir=(-0.3144673409, 0, -0.9492682927)), keep=Keep.TOP)


with BuildPart() as f1_13:
    add(f1_12.part)

    # F16_t84: cut F16_tool85
    add(f16_tool85.part, mode=Mode.SUBTRACT)


with BuildPart() as f16_tool90:
    # F16_s91 → F16_t92 (new body)
    with BuildSketch(Plane.XY.offset(1.6001427431)):
        with BuildLine():
            ThreePointArc((0.1651, -0.7493), (0.1502210245, -0.7852210245), (0.1143, -0.8001))
            Line((0.1143, -0.8001), (0.1651, -0.8001))
            Line((0.1651, -0.8001), (0.1651, -0.7493))
        make_face()
    extrude(amount=F16_T92_DEPTH)

    split(bisect_by=Plane.XY.offset(1.7144427431), keep=Keep.TOP)


with BuildPart() as f1_14:
    add(f1_13.part)

    # F16_t89: cut F16_tool90
    add(f16_tool90.part, mode=Mode.SUBTRACT)


with BuildPart() as f16_tool95:
    # F16_s96 → F16_t97 (new body)
    with BuildSketch(Plane.YZ.offset(0.1143)):
        with BuildLine():
            ThreePointArc((-0.8001, 1.8287427431), (-0.7852210245, 1.8646637676), (-0.7493, 1.8795427431))
            Line((-0.7493, 1.8795427431), (-0.8001, 1.8795427431))
            Line((-0.8001, 1.8795427431), (-0.8001, 1.8287427431))
        make_face()
    extrude(amount=-F16_T97_DEPTH)

    split(bisect_by=Plane(origin=(-0.526949453, 0, 0.1745643403), x_dir=(0, 1, 0), z_dir=(0.9492682927, 0, -0.3144673409)), keep=Keep.TOP)


with BuildPart() as f1_15:
    add(f1_14.part)

    # F16_t94: cut F16_tool95
    add(f16_tool95.part, mode=Mode.SUBTRACT)


with BuildPart() as f16_tool101:
    # F16_s102 → F16_t103 (new body)
    with BuildSketch(Plane.XY.offset(1.2445427431)):
        with BuildLine():
            ThreePointArc((0.1651, -0.1143), (0.1502210245, -0.1502210245), (0.1143, -0.1651))
            Line((0.1143, -0.1651), (0.1651, -0.1651))
            Line((0.1651, -0.1651), (0.1651, -0.1143))
        make_face()
    extrude(amount=F16_T103_DEPTH)

    split(bisect_by=Plane.XY.offset(1.5493427431), keep=Keep.TOP)


with BuildPart() as f16_tool105:
    # F16_s106 → F16_t107 (new body)
    with BuildSketch(Plane.XZ.offset(0.0381)):
        with BuildLine():
            ThreePointArc((0.1651, 1.6001427431), (0.1502210245, 1.5642217186), (0.1143, 1.5493427431))
            Line((0.1143, 1.5493427431), (0.1651, 1.5493427431))
            Line((0.1651, 1.5493427431), (0.1651, 1.6001427431))
        make_face()
    extrude(amount=F16_T107_DEPTH)

    split(bisect_by=Plane.XZ.offset(0.1651), keep=Keep.BOTTOM)


with BuildPart() as f16_tool101_1:
    add(f16_tool101.part)

    # F16_t109: intersect F16_tool105
    add(f16_tool105.part, mode=Mode.INTERSECT)


with BuildPart() as f1_16:
    add(f1_15.part)

    # F16_t99: cut F16_tool101
    add(f16_tool101_1.part, mode=Mode.SUBTRACT)


with BuildPart() as f16_tool112:
    # F16_s113 → F16_t114 (new body)
    with BuildSketch(Plane.XY.offset(1.2445427431)):
        with BuildLine():
            ThreePointArc((-0.1143, -0.1651), (-0.1502210245, -0.1502210245), (-0.1651, -0.1143))
            Line((-0.1651, -0.1143), (-0.1651, -0.1651))
            Line((-0.1651, -0.1651), (-0.1143, -0.1651))
        make_face()
    extrude(amount=F16_T114_DEPTH)

    split(bisect_by=Plane.XY.offset(1.5493427431), keep=Keep.TOP)


with BuildPart() as f16_tool116:
    # F16_s117 → F16_t118 (new body)
    with BuildSketch(Plane.XZ.offset(0.0381)):
        with BuildLine():
            ThreePointArc((-0.1651, 1.6001427431), (-0.1502210245, 1.5642217186), (-0.1143, 1.5493427431))
            Line((-0.1143, 1.5493427431), (-0.1651, 1.5493427431))
            Line((-0.1651, 1.5493427431), (-0.1651, 1.6001427431))
        make_face()
    extrude(amount=F16_T118_DEPTH)

    split(bisect_by=Plane.XZ.offset(0.1651), keep=Keep.BOTTOM)


with BuildPart() as f16_tool112_1:
    add(f16_tool112.part)

    # F16_t120: intersect F16_tool116
    add(f16_tool116.part, mode=Mode.INTERSECT)


with BuildPart() as f1_17:
    add(f1_16.part)

    # F16_t110: cut F16_tool112
    add(f16_tool112_1.part, mode=Mode.SUBTRACT)

    # F17
    f17_edges = [f1_17.edges().sort_by_distance(p)[0] for p in [
        (-0.381, 0, 1.244543),
        (-0.381, 0, -1.295457),
    ]]
    fillet(f17_edges, radius=F17_R)


solid = f1_17.part
